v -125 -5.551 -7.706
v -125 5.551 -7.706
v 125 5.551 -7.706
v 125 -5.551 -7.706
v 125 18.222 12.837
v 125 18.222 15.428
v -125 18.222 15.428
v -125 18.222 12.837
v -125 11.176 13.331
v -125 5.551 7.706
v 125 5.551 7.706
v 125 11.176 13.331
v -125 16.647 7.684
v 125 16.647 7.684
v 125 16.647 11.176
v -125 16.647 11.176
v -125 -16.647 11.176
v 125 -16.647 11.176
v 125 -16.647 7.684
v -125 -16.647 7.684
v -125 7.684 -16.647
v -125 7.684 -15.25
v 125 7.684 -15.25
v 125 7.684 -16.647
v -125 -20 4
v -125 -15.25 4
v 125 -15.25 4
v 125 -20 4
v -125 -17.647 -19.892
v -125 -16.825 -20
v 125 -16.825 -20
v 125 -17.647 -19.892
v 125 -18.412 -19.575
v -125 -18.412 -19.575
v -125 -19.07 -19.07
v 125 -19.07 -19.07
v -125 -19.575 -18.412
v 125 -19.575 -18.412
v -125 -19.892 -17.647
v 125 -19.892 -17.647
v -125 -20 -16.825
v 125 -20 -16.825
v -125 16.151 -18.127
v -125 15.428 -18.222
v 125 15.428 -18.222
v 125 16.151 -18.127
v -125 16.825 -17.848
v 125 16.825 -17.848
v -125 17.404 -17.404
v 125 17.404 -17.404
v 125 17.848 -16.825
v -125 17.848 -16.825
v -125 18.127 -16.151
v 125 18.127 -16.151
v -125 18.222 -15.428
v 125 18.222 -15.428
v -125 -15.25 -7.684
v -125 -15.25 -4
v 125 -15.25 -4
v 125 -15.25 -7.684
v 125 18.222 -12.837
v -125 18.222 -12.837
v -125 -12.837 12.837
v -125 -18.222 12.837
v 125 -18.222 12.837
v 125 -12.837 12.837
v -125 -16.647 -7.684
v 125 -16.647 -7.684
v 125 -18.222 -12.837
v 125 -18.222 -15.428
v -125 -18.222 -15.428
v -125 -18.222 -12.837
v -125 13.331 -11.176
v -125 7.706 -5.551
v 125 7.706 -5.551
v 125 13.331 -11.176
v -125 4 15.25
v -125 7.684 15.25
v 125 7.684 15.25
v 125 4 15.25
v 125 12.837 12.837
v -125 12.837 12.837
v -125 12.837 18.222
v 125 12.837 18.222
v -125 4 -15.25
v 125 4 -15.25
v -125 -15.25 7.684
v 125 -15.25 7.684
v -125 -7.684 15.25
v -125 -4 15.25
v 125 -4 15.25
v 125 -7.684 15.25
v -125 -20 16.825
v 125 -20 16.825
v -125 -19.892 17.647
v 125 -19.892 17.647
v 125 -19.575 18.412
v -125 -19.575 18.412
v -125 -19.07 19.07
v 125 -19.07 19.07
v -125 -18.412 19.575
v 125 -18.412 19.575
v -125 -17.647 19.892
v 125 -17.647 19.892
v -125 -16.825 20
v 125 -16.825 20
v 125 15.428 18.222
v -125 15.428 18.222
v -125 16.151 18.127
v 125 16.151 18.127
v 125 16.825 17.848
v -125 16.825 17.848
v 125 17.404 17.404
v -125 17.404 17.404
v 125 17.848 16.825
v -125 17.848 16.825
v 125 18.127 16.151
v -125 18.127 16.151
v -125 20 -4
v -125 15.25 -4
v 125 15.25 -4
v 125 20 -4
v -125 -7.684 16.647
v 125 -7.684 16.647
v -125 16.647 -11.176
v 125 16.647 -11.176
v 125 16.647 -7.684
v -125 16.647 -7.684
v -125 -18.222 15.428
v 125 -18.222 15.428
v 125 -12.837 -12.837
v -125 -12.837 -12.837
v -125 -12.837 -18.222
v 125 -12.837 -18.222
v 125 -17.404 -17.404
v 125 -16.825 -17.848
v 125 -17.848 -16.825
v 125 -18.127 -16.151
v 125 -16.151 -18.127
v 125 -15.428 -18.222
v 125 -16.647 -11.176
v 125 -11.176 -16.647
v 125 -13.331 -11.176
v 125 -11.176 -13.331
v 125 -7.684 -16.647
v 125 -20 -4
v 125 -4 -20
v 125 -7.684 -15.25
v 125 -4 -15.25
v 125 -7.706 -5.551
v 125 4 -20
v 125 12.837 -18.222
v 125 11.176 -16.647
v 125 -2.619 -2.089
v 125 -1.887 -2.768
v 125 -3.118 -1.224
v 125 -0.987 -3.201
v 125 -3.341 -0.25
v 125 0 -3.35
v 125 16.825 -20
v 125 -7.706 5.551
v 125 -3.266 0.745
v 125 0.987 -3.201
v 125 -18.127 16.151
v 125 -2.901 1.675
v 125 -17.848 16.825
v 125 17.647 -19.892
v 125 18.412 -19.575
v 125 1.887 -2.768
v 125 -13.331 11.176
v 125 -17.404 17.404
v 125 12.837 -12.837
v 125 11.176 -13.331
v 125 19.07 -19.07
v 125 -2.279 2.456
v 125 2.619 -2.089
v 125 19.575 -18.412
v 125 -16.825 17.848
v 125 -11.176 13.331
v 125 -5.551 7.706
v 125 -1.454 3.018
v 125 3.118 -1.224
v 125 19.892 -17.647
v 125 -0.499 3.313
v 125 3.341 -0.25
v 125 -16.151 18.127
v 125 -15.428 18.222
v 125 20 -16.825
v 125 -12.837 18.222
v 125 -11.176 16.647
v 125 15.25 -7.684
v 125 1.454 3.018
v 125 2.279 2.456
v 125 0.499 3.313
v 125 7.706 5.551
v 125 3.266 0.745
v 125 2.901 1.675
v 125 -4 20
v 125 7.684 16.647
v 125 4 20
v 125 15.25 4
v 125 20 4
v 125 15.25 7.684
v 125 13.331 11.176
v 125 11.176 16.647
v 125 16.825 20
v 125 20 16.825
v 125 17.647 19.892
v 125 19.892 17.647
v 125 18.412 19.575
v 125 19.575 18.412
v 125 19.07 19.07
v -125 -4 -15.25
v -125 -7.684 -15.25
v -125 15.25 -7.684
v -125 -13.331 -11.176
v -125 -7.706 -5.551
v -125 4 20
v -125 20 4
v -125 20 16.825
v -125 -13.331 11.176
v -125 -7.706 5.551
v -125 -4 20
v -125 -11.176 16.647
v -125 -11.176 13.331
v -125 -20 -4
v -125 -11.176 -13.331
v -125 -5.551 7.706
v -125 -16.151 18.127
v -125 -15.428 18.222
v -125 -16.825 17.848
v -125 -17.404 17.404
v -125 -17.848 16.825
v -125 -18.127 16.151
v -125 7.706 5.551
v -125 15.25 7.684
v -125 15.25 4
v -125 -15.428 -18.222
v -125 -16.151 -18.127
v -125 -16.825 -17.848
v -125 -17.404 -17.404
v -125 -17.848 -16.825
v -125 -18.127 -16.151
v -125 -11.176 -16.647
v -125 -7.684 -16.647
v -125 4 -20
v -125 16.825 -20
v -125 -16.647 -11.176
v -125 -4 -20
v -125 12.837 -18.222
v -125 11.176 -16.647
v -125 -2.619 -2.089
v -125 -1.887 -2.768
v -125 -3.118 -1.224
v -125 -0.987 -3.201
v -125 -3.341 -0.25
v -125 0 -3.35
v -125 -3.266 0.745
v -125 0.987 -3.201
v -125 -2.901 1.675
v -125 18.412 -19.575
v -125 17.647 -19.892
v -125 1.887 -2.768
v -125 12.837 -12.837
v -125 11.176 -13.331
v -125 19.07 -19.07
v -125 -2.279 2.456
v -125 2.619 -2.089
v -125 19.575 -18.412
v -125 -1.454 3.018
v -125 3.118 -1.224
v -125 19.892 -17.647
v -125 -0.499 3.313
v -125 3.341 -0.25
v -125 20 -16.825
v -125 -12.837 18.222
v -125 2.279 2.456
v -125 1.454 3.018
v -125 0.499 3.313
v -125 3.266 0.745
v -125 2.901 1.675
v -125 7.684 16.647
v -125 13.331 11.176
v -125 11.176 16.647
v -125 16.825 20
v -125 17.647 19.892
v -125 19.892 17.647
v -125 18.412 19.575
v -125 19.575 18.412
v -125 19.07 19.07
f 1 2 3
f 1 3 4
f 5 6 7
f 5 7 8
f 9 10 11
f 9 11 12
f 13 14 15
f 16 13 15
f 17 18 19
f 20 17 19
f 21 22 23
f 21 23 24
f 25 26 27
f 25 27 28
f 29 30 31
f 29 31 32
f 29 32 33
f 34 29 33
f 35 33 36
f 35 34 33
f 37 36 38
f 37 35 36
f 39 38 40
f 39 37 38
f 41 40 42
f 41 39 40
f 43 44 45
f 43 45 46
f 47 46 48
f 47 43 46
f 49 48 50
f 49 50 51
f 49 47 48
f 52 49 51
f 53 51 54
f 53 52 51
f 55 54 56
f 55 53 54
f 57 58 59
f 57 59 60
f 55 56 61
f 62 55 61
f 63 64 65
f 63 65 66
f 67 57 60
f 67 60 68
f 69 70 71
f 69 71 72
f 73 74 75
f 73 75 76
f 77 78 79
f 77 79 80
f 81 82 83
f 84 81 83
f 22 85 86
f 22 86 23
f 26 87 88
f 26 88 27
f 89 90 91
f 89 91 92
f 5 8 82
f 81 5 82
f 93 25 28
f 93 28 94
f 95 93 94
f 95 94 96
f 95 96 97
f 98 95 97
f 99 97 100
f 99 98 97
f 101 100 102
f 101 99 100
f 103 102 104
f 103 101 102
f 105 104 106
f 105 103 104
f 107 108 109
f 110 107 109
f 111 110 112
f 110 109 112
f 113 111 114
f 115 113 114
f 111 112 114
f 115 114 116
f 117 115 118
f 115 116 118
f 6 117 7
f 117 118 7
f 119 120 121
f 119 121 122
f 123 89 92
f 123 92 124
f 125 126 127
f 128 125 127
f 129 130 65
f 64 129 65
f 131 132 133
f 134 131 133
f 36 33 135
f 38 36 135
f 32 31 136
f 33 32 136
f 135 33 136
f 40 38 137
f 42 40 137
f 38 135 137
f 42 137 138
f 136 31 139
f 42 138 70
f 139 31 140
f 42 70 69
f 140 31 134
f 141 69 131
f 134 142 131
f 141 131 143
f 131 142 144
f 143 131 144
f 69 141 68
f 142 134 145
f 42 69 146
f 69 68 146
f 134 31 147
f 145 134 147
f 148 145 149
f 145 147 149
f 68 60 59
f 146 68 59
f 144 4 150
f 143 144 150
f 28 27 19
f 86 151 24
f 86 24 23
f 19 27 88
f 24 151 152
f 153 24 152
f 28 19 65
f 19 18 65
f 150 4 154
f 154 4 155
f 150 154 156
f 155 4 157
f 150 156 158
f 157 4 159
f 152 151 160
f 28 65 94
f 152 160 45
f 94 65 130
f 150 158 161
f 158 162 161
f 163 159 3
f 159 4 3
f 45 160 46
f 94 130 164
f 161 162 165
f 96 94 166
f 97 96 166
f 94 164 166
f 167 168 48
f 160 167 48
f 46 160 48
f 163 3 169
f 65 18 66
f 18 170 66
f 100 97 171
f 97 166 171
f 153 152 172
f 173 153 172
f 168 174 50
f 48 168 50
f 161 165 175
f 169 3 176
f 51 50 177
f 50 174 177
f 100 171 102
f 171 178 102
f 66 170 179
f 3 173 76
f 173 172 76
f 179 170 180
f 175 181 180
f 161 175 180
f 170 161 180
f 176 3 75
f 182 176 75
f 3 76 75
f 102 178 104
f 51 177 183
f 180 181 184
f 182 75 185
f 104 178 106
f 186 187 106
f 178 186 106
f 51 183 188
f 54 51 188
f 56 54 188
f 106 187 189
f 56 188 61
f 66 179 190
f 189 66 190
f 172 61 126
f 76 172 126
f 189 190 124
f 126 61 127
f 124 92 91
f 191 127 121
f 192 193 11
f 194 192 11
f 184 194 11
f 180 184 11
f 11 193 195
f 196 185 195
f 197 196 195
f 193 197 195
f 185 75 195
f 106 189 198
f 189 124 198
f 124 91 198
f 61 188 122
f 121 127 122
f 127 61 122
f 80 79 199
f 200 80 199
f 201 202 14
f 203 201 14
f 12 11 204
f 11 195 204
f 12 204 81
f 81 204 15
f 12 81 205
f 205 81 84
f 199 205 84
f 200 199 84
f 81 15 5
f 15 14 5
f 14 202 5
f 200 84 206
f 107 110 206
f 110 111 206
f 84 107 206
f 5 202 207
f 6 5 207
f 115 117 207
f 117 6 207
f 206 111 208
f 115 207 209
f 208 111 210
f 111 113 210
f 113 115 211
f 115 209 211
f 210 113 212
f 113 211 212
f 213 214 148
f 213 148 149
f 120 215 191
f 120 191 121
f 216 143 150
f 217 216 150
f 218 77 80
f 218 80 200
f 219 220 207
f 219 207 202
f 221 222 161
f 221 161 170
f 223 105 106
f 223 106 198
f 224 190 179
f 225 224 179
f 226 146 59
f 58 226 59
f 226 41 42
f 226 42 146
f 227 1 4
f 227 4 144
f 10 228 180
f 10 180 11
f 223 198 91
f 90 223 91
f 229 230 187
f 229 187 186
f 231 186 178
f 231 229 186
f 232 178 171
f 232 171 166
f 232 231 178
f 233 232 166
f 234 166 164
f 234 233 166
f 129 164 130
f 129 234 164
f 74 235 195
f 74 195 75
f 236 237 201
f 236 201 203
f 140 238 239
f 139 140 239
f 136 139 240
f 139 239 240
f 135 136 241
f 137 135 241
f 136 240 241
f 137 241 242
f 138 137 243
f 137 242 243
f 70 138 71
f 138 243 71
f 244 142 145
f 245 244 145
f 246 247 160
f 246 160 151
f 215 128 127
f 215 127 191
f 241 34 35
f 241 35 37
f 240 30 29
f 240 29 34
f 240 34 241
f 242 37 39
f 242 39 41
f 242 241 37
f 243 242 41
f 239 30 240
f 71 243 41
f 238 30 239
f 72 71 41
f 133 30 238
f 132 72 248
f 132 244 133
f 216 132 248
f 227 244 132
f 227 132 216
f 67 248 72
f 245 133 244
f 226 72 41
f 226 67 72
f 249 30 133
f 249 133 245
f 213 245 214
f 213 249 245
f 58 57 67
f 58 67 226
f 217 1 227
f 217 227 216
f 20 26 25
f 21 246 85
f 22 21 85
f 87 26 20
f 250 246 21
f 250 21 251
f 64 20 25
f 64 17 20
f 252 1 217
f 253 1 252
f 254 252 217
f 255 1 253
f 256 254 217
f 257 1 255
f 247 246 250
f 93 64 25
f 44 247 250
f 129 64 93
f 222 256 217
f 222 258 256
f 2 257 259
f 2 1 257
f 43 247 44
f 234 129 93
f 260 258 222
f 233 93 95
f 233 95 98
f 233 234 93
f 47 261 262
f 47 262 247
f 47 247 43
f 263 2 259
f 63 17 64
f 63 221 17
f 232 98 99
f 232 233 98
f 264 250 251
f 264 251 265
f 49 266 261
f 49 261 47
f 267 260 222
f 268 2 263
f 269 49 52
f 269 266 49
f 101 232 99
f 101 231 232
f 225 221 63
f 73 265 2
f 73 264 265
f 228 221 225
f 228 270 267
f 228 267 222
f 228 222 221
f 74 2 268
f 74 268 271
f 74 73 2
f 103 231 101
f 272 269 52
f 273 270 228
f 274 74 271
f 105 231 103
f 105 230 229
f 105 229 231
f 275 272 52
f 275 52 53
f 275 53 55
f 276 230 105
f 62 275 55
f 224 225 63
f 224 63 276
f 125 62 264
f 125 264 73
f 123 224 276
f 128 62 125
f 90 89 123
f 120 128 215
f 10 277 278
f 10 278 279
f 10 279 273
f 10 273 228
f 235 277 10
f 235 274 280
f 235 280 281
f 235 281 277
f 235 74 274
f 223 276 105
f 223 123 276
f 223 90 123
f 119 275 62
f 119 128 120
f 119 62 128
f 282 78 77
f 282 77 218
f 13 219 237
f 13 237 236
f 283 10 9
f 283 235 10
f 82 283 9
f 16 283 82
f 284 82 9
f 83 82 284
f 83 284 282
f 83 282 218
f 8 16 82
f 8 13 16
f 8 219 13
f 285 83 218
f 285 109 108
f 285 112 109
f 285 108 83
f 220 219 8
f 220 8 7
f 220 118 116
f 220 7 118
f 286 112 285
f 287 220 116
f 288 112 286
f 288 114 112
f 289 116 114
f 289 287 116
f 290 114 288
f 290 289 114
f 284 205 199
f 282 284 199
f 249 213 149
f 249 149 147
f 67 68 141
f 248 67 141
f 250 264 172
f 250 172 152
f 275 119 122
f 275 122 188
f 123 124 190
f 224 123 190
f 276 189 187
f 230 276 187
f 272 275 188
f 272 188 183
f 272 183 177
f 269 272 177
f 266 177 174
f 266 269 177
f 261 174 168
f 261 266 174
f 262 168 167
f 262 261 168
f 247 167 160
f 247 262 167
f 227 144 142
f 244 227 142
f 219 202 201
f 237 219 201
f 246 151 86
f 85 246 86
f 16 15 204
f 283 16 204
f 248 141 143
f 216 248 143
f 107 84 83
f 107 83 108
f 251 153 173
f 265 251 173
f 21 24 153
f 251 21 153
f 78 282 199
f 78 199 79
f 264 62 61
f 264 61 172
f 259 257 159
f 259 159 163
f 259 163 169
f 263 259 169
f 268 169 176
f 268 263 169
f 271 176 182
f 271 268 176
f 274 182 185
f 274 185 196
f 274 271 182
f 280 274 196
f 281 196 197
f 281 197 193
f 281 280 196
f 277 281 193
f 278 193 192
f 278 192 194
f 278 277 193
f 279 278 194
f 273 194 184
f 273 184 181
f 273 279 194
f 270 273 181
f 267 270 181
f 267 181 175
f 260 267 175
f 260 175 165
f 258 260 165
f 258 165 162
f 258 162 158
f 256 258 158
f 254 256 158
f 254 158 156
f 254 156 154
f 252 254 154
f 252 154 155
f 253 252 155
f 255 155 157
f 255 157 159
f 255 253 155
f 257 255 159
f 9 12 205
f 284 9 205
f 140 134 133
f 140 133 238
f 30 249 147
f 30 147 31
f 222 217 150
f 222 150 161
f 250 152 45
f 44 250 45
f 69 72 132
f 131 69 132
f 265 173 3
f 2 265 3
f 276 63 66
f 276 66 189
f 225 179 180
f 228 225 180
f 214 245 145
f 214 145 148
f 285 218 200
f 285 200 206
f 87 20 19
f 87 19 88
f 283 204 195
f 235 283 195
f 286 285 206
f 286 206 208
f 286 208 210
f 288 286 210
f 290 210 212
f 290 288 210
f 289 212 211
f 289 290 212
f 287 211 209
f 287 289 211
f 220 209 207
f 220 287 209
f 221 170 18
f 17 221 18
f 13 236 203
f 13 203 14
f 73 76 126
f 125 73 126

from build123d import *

# Parameters (mm, degrees)
SKETCH2_R                            = 3.35
F_40_SERIES_TS40_40LM_650033_1_DEPTH = 250


with BuildPart() as part:
    # Sketch2 → 40 series TS40-40LM-650033(1) (new body)
    with BuildSketch(Plane(origin=(-125, 0, 0), x_dir=(0, 0, -1), z_dir=(1, 0, 0))):
        with BuildLine():
            Line((-7.7064, 0), (-7.7064, 5.551138531))
            Line((-7.7064, 5.551138531), (-13.331261469, 11.176))
            Line((-13.331261469, 11.176), (-16.6472, 11.176))
            Line((-16.6472, 11.176), (-16.6472, 7.6835))
            Line((-16.6472, 7.6835), (-15.2502, 7.6835))
            Line((-15.2502, 7.6835), (-15.2502, 4.0005))
            Line((-15.2502, 4.0005), (-20, 4.0005))
            Line((-20, 4.0005), (-20, 16.825))
            ThreePointArc((-20, 16.825), (-19.07006403, 19.07006403), (-16.825, 20))
            Line((-16.825, 20), (-4.0005, 20))
            Line((-4.0005, 20), (-4.0005, 15.2502))
            Line((-4.0005, 15.2502), (-7.6835, 15.2502))
            Line((-7.6835, 15.2502), (-7.6835, 16.6472))
            Line((-7.6835, 16.6472), (-11.176, 16.6472))
            Line((-11.176, 16.6472), (-11.176, 13.331261469))
            Line((-11.176, 13.331261469), (-5.551138531, 7.7064))
            Line((-5.551138531, 7.7064), (0, 7.7064))
            Line((0, 7.7064), (5.551138531, 7.7064))
            Line((5.551138531, 7.7064), (11.176, 13.331261469))
            Line((11.176, 13.331261469), (11.176, 16.6472))
            Line((11.176, 16.6472), (7.6835, 16.6472))
            Line((7.6835, 16.6472), (7.6835, 15.2502))
            Line((7.6835, 15.2502), (4.0005, 15.2502))
            Line((4.0005, 15.2502), (4.0005, 20))
            Line((4.0005, 20), (16.825, 20))
            ThreePointArc((16.825, 20), (19.07006403, 19.07006403), (20, 16.825))
            Line((20, 16.825), (20, 4.0005))
            Line((20, 4.0005), (15.2502, 4.0005))
            Line((15.2502, 4.0005), (15.2502, 7.6835))
            Line((15.2502, 7.6835), (16.6472, 7.6835))
            Line((16.6472, 7.6835), (16.6472, 11.176))
            Line((16.6472, 11.176), (13.331261469, 11.176))
            Line((13.331261469, 11.176), (7.7064, 5.551138531))
            Line((7.7064, 5.551138531), (7.7064, 0))
            Line((7.7064, 0), (7.7064, -5.551138531))
            Line((7.7064, -5.551138531), (13.331261469, -11.176))
            Line((13.331261469, -11.176), (16.6472, -11.176))
            Line((16.6472, -11.176), (16.6472, -7.6835))
            Line((16.6472, -7.6835), (15.2502, -7.6835))
            Line((15.2502, -7.6835), (15.2502, -4.0005))
            Line((15.2502, -4.0005), (20, -4.0005))
            Line((20, -4.0005), (20, -16.825))
            ThreePointArc((20, -16.825), (19.07006403, -19.07006403), (16.825, -20))
            Line((16.825, -20), (4.0005, -20))
            Line((4.0005, -20), (4.0005, -15.2502))
            Line((4.0005, -15.2502), (7.6835, -15.2502))
            Line((7.6835, -15.2502), (7.6835, -16.6472))
            Line((7.6835, -16.6472), (11.176, -16.6472))
            Line((11.176, -16.6472), (11.176, -13.331261469))
            Line((11.176, -13.331261469), (5.551138531, -7.7064))
            Line((5.551138531, -7.7064), (0, -7.7064))
            Line((0, -7.7064), (-5.551138531, -7.7064))
            Line((-5.551138531, -7.7064), (-11.176, -13.331261469))
            Line((-11.176, -13.331261469), (-11.176, -16.6472))
            Line((-11.176, -16.6472), (-7.6835, -16.6472))
            Line((-7.6835, -16.6472), (-7.6835, -15.2502))
            Line((-7.6835, -15.2502), (-4.0005, -15.2502))
            Line((-4.0005, -15.2502), (-4.0005, -20))
            Line((-4.0005, -20), (-16.825, -20))
            ThreePointArc((-16.825, -20), (-19.07006403, -19.07006403), (-20, -16.825))
            Line((-20, -16.825), (-20, -4.0005))
            Line((-20, -4.0005), (-15.2502, -4.0005))
            Line((-15.2502, -4.0005), (-15.2502, -7.6835))
            Line((-15.2502, -7.6835), (-16.6472, -7.6835))
            Line((-16.6472, -7.6835), (-16.6472, -11.176))
            Line((-16.6472, -11.176), (-13.331261469, -11.176))
            Line((-13.331261469, -11.176), (-7.7064, -5.551138531))
            Line((-7.7064, -5.551138531), (-7.7064, 0))
        make_face()
        Circle(SKETCH2_R, mode=Mode.SUBTRACT)
        with BuildLine():
            Line((18.222, 12.8372), (18.222, 15.428))
            ThreePointArc((18.222, 15.428), (17.403656347, 17.403656347), (15.428, 18.222))
            Line((15.428, 18.222), (12.8372, 18.222))
            Line((12.8372, 18.222), (12.8372, 12.8372))
            Line((12.8372, 12.8372), (18.222, 12.8372))
        make_face(mode=Mode.SUBTRACT)
        with BuildLine():
            Line((12.8372, -12.8372), (18.222, -12.8372))
            Line((18.222, -12.8372), (18.222, -15.428))
            ThreePointArc((18.222, -15.428), (17.403656347, -17.403656347), (15.428, -18.222))
            Line((15.428, -18.222), (12.8372, -18.222))
            Line((12.8372, -18.222), (12.8372, -12.8372))
        make_face(mode=Mode.SUBTRACT)
        with BuildLine():
            Line((-18.222, -12.8372), (-18.222, -15.428))
            ThreePointArc((-18.222, -15.428), (-17.403656347, -17.403656347), (-15.428, -18.222))
            Line((-15.428, -18.222), (-12.8372, -18.222))
            Line((-12.8372, -18.222), (-12.8372, -12.8372))
            Line((-12.8372, -12.8372), (-18.222, -12.8372))
        make_face(mode=Mode.SUBTRACT)
        with BuildLine():
            Line((-12.8372, 12.8372), (-18.222, 12.8372))
            Line((-18.222, 12.8372), (-18.222, 15.428))
            ThreePointArc((-18.222, 15.428), (-17.403656347, 17.403656347), (-15.428, 18.222))
            Line((-15.428, 18.222), (-12.8372, 18.222))
            Line((-12.8372, 18.222), (-12.8372, 12.8372))
        make_face(mode=Mode.SUBTRACT)
    extrude(amount=F_40_SERIES_TS40_40LM_650033_1_DEPTH)


solid = part.part
